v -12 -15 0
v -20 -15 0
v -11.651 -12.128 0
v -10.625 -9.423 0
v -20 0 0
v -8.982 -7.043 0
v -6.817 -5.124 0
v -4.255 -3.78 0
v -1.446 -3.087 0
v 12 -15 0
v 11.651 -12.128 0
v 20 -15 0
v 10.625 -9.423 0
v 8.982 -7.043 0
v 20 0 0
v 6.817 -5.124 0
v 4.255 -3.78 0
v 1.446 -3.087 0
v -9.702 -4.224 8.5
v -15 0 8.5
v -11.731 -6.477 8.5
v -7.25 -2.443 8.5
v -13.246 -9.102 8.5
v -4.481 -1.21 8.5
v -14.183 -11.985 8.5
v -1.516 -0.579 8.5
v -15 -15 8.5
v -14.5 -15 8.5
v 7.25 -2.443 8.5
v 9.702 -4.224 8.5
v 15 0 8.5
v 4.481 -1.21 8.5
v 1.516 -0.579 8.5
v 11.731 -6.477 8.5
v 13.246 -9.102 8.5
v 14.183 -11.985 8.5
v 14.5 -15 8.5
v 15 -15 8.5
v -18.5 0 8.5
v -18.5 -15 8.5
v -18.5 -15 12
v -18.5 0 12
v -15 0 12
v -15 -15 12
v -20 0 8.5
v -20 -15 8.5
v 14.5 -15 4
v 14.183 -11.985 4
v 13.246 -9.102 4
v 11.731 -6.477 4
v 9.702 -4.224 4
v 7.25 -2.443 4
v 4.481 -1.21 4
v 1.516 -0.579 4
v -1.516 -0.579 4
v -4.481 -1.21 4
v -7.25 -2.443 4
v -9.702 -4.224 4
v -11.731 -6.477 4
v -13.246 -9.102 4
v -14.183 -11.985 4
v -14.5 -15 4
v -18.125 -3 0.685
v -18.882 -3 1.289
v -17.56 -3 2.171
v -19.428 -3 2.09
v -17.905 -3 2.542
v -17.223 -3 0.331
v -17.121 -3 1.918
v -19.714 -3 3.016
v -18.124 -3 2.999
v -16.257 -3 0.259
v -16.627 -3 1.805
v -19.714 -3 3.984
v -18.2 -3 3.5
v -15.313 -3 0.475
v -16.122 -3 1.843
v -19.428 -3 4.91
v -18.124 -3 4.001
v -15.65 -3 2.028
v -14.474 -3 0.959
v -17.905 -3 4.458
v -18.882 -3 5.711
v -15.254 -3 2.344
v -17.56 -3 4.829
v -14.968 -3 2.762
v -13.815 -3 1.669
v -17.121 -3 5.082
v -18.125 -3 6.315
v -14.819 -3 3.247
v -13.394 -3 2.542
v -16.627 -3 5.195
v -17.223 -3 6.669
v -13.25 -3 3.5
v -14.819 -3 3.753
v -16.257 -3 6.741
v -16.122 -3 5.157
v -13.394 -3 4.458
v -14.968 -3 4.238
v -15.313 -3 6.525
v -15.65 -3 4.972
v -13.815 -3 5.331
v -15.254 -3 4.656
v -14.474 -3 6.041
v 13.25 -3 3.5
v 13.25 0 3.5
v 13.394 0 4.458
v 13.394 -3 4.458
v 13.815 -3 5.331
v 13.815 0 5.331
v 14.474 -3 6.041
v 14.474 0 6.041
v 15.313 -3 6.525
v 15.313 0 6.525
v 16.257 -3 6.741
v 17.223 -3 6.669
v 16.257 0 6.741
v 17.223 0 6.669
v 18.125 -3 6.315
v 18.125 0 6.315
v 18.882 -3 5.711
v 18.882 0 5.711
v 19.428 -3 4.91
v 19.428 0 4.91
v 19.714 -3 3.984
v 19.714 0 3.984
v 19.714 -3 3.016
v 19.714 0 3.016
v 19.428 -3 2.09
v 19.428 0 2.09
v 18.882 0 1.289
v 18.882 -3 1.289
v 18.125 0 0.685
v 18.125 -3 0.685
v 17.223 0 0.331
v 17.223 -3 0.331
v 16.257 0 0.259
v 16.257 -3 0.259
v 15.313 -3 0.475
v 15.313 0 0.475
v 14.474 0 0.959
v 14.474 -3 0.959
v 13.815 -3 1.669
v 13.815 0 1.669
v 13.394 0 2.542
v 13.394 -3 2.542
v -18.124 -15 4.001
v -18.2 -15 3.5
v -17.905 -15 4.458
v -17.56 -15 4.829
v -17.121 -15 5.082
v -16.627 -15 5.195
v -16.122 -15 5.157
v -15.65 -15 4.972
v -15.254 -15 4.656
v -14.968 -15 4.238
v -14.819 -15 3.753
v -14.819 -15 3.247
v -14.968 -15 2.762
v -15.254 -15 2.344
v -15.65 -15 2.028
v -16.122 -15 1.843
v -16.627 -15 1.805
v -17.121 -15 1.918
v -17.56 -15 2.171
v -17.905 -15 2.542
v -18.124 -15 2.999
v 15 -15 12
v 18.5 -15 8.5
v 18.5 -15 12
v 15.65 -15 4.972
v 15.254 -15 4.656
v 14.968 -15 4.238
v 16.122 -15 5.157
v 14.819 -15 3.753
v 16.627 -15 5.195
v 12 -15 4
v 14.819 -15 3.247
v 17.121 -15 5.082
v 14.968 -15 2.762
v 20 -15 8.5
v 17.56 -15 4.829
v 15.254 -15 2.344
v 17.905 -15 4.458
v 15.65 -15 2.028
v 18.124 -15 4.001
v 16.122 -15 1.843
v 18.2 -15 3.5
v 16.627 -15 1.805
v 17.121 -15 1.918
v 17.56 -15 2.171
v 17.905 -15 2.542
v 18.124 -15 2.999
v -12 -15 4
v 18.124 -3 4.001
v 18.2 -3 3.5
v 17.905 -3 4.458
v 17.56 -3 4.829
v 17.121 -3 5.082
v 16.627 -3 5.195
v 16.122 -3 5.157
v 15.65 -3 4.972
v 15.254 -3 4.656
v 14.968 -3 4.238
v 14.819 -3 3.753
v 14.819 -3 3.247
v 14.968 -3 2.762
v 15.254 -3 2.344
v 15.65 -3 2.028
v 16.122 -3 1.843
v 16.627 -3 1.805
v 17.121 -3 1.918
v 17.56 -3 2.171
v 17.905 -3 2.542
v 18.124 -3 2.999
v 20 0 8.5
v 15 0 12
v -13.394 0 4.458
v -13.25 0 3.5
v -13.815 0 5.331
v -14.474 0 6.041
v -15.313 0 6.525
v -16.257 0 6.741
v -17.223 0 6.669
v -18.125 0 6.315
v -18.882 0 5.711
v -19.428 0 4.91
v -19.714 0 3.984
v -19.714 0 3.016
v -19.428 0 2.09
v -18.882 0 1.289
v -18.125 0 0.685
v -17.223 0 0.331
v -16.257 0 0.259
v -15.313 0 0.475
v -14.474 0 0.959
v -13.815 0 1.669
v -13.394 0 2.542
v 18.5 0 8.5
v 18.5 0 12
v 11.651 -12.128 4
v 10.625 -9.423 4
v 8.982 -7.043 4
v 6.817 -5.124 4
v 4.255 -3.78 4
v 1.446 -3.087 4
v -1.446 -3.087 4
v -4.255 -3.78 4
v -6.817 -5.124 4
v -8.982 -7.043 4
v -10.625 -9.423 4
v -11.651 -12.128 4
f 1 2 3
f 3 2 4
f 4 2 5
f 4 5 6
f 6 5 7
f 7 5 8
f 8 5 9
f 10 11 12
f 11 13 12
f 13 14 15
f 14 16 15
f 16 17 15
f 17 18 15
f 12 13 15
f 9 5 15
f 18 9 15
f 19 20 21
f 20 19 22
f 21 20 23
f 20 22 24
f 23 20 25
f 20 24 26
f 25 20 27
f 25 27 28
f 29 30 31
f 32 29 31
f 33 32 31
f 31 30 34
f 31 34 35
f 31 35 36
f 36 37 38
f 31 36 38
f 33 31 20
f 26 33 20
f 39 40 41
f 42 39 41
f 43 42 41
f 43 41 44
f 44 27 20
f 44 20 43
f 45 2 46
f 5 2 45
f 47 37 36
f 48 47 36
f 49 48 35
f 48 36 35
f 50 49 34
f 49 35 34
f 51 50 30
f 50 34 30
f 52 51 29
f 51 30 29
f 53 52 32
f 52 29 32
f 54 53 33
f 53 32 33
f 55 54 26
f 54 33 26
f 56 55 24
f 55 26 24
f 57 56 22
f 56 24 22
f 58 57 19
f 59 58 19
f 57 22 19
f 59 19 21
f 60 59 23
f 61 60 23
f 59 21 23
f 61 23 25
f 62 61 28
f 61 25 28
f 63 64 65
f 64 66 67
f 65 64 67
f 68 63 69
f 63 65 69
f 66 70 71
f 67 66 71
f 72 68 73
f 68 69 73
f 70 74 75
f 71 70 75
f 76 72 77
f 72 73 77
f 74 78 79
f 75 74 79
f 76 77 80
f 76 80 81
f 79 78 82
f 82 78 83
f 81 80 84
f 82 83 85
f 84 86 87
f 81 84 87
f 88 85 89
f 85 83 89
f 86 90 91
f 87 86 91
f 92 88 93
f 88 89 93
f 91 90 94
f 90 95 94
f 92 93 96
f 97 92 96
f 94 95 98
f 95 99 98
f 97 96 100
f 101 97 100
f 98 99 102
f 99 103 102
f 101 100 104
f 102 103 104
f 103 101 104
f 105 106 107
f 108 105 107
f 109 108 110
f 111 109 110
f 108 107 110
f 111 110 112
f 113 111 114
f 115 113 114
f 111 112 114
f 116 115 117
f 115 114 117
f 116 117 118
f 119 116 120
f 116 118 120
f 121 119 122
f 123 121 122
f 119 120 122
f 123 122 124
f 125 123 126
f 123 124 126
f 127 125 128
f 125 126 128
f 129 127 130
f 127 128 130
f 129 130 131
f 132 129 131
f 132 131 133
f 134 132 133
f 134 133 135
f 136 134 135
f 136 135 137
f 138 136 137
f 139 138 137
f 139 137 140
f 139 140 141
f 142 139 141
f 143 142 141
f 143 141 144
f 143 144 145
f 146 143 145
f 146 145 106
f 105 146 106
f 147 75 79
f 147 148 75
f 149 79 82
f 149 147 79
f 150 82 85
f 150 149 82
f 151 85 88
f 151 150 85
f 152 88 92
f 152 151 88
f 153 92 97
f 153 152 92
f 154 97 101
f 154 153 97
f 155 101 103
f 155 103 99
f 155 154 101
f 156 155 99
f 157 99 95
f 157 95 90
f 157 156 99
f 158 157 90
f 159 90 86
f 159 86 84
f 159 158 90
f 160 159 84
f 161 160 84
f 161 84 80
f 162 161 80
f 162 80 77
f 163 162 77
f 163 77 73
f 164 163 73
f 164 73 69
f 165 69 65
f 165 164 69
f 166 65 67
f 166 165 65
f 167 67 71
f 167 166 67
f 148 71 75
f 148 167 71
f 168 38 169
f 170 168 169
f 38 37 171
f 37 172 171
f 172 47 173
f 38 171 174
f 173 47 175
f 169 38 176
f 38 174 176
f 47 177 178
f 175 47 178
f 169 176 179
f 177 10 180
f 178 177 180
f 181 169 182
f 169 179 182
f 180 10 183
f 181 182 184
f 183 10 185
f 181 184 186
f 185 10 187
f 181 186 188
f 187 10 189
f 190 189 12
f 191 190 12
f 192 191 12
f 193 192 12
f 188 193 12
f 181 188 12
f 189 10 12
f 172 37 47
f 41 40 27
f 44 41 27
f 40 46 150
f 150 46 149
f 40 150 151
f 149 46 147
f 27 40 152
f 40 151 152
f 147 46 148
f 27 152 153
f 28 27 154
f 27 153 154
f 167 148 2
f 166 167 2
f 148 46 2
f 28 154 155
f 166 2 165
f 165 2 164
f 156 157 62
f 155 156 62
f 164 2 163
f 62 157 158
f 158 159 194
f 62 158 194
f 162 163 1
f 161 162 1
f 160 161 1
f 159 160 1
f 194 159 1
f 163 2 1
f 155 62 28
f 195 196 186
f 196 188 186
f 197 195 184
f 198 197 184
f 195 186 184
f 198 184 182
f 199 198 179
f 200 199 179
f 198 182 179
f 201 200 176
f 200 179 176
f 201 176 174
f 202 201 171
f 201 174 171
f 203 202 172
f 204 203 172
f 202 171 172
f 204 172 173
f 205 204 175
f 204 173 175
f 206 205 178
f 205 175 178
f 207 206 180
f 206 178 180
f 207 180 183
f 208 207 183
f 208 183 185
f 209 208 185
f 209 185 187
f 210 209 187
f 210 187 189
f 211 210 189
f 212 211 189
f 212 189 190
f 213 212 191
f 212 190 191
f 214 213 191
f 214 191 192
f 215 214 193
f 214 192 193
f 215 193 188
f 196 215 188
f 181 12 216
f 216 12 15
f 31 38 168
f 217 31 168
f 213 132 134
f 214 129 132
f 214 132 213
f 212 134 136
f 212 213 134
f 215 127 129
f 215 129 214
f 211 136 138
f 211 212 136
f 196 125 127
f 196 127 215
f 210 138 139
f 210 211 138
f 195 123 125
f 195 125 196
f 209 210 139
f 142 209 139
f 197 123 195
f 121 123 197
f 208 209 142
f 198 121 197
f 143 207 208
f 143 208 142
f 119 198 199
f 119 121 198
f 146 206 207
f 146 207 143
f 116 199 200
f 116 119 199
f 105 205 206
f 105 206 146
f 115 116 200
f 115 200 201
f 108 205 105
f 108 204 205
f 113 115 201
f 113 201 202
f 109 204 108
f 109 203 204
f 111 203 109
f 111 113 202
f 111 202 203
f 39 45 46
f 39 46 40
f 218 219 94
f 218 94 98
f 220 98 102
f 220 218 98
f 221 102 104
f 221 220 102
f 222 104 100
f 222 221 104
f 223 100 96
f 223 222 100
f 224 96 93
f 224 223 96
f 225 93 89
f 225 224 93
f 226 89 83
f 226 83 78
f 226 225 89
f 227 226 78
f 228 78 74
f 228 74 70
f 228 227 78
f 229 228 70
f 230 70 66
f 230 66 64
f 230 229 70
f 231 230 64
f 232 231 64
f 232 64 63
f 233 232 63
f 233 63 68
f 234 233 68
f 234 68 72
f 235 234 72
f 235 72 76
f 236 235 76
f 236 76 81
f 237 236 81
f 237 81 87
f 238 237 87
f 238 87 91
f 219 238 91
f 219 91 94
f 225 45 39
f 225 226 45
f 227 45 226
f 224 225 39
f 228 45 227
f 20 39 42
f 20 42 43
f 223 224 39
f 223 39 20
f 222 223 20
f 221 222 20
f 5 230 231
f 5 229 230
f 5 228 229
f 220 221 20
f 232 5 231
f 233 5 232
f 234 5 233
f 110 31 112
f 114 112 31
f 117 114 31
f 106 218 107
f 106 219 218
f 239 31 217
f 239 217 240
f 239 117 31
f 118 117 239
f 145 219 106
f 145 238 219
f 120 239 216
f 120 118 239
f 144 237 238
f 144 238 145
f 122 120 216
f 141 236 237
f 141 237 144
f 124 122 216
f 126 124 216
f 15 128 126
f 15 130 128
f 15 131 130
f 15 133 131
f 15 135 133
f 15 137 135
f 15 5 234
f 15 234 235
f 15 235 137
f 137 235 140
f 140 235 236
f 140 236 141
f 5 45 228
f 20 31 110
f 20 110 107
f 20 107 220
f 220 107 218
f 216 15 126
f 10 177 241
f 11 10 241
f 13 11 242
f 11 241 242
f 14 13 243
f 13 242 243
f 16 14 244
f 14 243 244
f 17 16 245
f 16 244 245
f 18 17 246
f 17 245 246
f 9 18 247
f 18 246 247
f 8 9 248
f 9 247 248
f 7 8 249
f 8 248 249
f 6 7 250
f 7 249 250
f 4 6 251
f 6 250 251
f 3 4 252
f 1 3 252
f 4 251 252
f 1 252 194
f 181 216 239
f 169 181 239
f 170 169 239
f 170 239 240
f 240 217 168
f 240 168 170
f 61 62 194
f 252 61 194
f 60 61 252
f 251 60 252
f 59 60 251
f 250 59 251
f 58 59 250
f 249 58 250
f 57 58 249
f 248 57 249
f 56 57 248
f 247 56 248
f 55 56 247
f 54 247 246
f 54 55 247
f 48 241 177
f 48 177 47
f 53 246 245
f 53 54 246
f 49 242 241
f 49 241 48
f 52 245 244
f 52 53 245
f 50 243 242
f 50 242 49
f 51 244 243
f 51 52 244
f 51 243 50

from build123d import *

# Parameters (mm, degrees)
F0_W            = 40
F0_H            = 15
F1_DEPTH        = 12
F3_DEPTH        = 8
F5_DEPTH        = 4
F6_W            = 1.5
F6_H            = 3.5
F7_DEPTH        = 15
F8_W            = 0.5
F8_H            = 3.5
F8_W_2          = 29.5
F9_DEPTH        = 15
F11_D           = 3.4
F11_CBORE_D     = 6.5
F11_CBORE_DEPTH = 3


# Not quite as in the source:
# - a pattern or mirror of a feature is missing from the dataset's text; its kind, count and spacing are read off the source's solid


with BuildPart() as f1:
    # F0 (on Top) → F1 (new body)
    with BuildSketch(Plane.XY):
        with Locations((0, -7.5)):
            Rectangle(F0_W, F0_H)
    extrude(amount=F1_DEPTH)

    # F2 (on face) → F3 (cut)
    with BuildSketch(Plane.XY.offset(12)):
        with BuildLine():
            Line((-14.5, -15), (14.5, -15))
            ThreePointArc((14.5, -15), (0, -0.5), (-14.5, -15))
        make_face()
    extrude(amount=-F3_DEPTH, mode=Mode.SUBTRACT)

    # F4 (on face) → F5 (cut, through all)
    with BuildSketch(Plane.XY.offset(4)):
        with BuildLine():
            Line((-12, -15), (12, -15))
            ThreePointArc((12, -15), (0, -3), (-12, -15))
        make_face()
    extrude(amount=-F5_DEPTH, mode=Mode.SUBTRACT)

    # F6 (on face) → F7 (cut, through all)
    with BuildSketch(Plane.XZ.offset(15)):
        with Locations((-19.25, 10.25)):
            Rectangle(F6_W, F6_H)
    f7 = extrude(amount=-F7_DEPTH, mode=Mode.SUBTRACT)

    # F7_copies: F7 across plane
    add(f7.mirror(Plane(origin=(0, 0, 0), x_dir=(0, 0, 1), z_dir=(1, 0, 0))), mode=Mode.SUBTRACT)

    # F8 (on face) → F9 (cut, through all)
    with BuildSketch(Plane.XZ.offset(15)):
        with Locations((-14.75, 10.25)):
            Rectangle(F8_W, F8_H)
        with Locations((0.25, 10.25)):
            Rectangle(F8_W_2, F8_H)
    extrude(amount=-F9_DEPTH, mode=Mode.SUBTRACT)

    # F11 (through all)
    with Locations(Plane(origin=(0, 0, 0), x_dir=(-1, 0, 0), z_dir=(0, 1, 0))):
        with Locations((-16.5, 3.5)):
            f11 = CounterBoreHole(F11_D / 2, F11_CBORE_D / 2, F11_CBORE_DEPTH)

    # F11_copies: F11 across plane
    add(f11.mirror(Plane(origin=(0, 0, 0), x_dir=(0, 0, -1), z_dir=(-1, 0, 0))), mode=Mode.SUBTRACT)


solid = f1.part
